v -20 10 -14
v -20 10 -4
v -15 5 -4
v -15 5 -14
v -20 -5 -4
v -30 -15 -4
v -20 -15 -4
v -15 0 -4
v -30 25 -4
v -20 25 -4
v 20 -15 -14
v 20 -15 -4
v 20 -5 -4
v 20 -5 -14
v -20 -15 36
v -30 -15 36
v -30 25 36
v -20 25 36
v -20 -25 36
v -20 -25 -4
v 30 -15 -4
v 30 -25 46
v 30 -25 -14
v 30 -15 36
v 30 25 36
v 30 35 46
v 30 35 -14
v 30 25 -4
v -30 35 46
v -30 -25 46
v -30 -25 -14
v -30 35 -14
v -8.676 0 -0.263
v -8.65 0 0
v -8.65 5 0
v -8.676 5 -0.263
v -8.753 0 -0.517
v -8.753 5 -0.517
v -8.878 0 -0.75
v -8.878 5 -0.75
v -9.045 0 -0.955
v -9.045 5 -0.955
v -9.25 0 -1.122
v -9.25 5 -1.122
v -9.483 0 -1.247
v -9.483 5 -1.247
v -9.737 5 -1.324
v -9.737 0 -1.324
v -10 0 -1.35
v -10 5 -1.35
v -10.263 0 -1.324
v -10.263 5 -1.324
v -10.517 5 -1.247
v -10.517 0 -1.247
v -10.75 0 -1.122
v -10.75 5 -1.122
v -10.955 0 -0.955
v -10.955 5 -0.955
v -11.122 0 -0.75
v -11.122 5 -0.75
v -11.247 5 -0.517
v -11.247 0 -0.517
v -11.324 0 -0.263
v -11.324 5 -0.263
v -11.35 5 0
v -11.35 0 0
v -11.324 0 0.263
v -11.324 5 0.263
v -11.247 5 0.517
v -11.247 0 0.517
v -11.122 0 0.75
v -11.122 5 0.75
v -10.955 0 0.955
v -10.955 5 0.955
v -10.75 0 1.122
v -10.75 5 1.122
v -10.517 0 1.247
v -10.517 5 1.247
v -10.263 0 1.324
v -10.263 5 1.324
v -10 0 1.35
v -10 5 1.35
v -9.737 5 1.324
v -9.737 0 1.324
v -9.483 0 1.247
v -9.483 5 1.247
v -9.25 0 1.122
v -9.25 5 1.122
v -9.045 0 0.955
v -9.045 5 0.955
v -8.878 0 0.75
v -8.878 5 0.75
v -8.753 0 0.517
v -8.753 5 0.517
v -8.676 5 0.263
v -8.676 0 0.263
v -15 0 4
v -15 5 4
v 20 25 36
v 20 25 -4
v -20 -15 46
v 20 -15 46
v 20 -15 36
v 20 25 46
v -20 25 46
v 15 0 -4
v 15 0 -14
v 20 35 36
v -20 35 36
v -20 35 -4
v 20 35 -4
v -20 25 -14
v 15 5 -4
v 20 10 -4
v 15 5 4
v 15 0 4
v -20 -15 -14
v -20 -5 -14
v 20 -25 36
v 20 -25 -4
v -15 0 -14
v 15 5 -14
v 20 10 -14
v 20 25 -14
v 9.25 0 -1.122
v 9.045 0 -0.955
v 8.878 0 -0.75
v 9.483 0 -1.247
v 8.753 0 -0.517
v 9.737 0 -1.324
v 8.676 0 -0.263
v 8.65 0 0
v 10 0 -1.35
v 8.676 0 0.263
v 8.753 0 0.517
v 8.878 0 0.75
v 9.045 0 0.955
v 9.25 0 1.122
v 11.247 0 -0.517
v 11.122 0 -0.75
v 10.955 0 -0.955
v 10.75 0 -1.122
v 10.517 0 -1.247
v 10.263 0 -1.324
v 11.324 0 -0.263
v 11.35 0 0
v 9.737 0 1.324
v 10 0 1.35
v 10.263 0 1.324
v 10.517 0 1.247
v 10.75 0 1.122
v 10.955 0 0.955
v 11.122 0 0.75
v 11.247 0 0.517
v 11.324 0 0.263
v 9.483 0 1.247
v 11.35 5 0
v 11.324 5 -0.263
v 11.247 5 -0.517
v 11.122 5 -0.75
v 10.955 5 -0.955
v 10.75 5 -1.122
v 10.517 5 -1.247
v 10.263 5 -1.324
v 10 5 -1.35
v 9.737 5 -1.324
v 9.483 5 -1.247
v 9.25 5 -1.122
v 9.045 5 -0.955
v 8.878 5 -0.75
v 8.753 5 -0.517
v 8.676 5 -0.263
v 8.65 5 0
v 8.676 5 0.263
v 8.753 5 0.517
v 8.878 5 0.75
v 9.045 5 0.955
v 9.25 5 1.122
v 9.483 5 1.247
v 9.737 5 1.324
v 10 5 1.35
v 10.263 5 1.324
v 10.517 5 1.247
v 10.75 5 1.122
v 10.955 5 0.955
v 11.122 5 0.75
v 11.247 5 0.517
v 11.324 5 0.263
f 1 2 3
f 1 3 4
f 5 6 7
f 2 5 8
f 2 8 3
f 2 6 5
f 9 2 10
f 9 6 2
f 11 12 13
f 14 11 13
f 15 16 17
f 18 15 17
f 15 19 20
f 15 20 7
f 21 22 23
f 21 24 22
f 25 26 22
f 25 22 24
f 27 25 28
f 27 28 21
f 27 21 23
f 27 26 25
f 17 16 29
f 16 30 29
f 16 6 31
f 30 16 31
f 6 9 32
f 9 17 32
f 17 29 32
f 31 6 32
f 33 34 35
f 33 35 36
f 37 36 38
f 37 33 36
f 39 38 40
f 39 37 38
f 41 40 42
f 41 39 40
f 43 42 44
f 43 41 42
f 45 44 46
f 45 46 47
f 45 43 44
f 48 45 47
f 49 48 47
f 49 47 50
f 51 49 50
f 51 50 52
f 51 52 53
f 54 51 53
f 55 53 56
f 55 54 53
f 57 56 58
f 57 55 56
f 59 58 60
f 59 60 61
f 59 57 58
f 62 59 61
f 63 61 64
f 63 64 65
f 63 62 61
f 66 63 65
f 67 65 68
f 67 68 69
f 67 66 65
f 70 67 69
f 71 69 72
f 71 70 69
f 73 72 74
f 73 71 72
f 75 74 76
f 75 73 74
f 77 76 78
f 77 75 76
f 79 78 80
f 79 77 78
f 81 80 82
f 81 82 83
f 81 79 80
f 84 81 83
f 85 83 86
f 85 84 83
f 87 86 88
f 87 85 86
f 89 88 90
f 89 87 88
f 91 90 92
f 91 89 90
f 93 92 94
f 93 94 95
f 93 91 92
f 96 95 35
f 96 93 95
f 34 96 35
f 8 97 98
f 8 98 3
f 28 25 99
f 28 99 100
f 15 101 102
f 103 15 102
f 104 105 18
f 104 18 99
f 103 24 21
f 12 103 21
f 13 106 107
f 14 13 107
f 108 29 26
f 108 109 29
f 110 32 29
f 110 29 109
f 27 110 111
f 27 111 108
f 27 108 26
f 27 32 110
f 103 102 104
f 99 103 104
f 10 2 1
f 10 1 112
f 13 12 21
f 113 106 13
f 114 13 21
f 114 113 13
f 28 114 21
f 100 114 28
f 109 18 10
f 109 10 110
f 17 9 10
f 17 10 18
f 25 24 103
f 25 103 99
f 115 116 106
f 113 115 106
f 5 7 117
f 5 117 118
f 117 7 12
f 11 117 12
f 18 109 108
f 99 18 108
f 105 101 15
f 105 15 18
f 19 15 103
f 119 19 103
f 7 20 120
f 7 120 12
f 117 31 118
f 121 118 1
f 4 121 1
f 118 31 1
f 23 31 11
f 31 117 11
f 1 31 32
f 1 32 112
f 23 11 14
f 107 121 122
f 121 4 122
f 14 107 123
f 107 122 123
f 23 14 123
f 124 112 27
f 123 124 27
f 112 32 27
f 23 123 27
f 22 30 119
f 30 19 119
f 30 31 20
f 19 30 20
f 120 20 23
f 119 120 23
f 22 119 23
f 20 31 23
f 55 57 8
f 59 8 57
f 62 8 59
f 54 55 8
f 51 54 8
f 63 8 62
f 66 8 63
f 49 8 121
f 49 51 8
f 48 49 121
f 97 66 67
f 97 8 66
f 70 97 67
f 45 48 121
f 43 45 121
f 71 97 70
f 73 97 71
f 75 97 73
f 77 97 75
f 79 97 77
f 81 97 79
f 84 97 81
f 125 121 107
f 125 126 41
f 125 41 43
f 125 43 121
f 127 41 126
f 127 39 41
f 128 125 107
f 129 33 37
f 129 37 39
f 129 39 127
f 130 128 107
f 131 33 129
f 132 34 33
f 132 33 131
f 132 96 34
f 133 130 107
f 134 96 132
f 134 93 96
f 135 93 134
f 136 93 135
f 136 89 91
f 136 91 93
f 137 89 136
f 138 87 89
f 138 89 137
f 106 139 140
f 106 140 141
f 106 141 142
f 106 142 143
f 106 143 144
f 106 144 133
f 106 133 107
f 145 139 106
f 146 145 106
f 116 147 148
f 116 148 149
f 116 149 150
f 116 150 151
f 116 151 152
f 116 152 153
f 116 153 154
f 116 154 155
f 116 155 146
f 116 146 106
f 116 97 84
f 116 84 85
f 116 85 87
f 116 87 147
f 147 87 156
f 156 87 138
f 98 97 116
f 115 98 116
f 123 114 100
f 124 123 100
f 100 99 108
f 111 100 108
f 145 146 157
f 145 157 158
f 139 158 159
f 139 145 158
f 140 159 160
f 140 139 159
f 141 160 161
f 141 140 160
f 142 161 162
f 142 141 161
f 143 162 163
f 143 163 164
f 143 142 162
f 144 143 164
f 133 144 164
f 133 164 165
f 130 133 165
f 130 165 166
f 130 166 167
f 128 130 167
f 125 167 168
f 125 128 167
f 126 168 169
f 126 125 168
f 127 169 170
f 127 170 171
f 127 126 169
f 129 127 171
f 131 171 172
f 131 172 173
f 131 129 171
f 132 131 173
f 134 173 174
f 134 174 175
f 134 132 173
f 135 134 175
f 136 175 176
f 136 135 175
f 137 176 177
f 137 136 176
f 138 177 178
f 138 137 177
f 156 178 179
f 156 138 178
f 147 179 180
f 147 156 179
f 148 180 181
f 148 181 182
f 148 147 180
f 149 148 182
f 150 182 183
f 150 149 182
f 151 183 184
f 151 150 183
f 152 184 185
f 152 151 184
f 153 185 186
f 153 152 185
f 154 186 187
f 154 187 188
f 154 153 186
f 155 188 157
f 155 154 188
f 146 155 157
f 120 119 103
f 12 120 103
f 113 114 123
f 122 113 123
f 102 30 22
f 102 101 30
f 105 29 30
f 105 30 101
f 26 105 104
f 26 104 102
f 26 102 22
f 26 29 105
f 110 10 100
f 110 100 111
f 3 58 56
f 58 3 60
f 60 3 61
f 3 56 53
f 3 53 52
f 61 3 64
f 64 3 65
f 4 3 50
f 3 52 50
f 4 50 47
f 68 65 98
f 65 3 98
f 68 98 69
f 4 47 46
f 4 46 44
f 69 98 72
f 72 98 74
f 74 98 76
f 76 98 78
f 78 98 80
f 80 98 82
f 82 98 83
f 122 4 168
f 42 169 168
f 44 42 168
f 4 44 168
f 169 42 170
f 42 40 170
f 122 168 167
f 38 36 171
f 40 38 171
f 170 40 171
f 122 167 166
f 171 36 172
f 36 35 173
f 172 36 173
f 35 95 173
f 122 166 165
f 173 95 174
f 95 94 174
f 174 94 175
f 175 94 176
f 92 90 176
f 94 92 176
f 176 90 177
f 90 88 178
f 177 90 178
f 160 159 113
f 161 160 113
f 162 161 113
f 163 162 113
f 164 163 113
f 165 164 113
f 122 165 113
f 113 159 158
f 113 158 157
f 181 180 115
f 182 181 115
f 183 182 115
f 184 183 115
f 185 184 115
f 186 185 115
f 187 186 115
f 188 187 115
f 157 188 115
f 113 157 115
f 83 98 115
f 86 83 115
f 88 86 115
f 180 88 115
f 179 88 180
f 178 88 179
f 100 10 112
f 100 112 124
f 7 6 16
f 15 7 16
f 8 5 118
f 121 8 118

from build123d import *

# Parameters (mm, degrees)
SKETCH_1_W           = 30
SKETCH_1_H           = 18
SKETCH_1_R           = 1.35
EXTRUDE_1_DEPTH      = 5
SKETCH_2_W           = 60
SKETCH_2_H           = 60
SKETCH_2_W_2         = 40
SKETCH_2_H_2         = 40
EXTRUDE_2_DEPTH      = 30
EXTRUDE_2_DEPTH_BACK = 30
SKETCH_3_W           = 40
SKETCH_3_H           = 40
CUT_EXTRUDE_1_DEPTH  = 10
SKETCH_4_W           = 40
SKETCH_4_H           = 40
CUT_EXTRUDE_2_DEPTH  = 10
SKETCH_5_W           = 40
SKETCH_5_H           = 40
CUT_EXTRUDE_3_DEPTH  = 10
SKETCH_6_W           = 40
SKETCH_6_H           = 20
SKETCH_6_H_2         = 15
CUT_EXTRUDE_4_DEPTH  = 10
CHAMFER_1_SIZE       = 5


with BuildPart() as part:
    # 스케치1 → 보스-돌출1 (new body)
    with BuildSketch(Plane(origin=(0, 0, 0), x_dir=(1, 0, 0), z_dir=(0, 1, 0))):
        with Locations((0, 5)):
            Rectangle(SKETCH_1_W, SKETCH_1_H)
        with Locations((-10, 0)):
            Circle(SKETCH_1_R, mode=Mode.SUBTRACT)
        with Locations((10, 0)):
            Circle(SKETCH_1_R, mode=Mode.SUBTRACT)
    extrude(amount=EXTRUDE_1_DEPTH)

    # 스케치2 → 보스-돌출2 (add, two sides)
    with BuildSketch(Plane(origin=(0, 5, 0), x_dir=(1, 0, 0), z_dir=(0, 1, 0))) as extrude_2_sk:
        with Locations((0, -16)):
            Rectangle(SKETCH_2_W, SKETCH_2_H)
        with Locations((0, -16)):
            Rectangle(SKETCH_2_W_2, SKETCH_2_H_2, mode=Mode.SUBTRACT)
    extrude(amount=EXTRUDE_2_DEPTH)
    extrude(extrude_2_sk.sketch, amount=-EXTRUDE_2_DEPTH_BACK)

    # 스케치3 → 컷-돌출1 (cut)
    with BuildSketch(Plane.XY.offset(46)):
        with Locations((0, 5)):
            Rectangle(SKETCH_3_W, SKETCH_3_H)
    extrude(amount=-CUT_EXTRUDE_1_DEPTH, mode=Mode.SUBTRACT)

    # 스케치4 → 컷-돌출2 (cut)
    with BuildSketch(Plane.ZY.offset(30)):
        with Locations((16, 5)):
            Rectangle(SKETCH_4_W, SKETCH_4_H)
    extrude(amount=-CUT_EXTRUDE_2_DEPTH, mode=Mode.SUBTRACT)

    # 스케치5 → 컷-돌출3 (cut)
    with BuildSketch(Plane(origin=(30, 0, 0), x_dir=(0, 0, -1), z_dir=(1, 0, 0))):
        with Locations((-16, 5)):
            Rectangle(SKETCH_5_W, SKETCH_5_H)
    extrude(amount=-CUT_EXTRUDE_3_DEPTH, mode=Mode.SUBTRACT)

    # 스케치6 → 컷-돌출4 (cut)
    with BuildSketch(Plane.XY.offset(-4)):
        with Locations((0, 15)):
            Rectangle(SKETCH_6_W, SKETCH_6_H)
        with Locations((0, -7.5)):
            Rectangle(SKETCH_6_W, SKETCH_6_H_2)
    extrude(amount=-CUT_EXTRUDE_4_DEPTH, mode=Mode.SUBTRACT)

    # 모따기1
    chamfer_1_edges = [part.edges().sort_by_distance(p)[0] for p in [
        (20, 5, -9),
        (-20, 5, -9),
        (-20, 0, -9),
        (20, 0, -9),
    ]]
    chamfer(chamfer_1_edges, length=CHAMFER_1_SIZE)


solid = part.part
